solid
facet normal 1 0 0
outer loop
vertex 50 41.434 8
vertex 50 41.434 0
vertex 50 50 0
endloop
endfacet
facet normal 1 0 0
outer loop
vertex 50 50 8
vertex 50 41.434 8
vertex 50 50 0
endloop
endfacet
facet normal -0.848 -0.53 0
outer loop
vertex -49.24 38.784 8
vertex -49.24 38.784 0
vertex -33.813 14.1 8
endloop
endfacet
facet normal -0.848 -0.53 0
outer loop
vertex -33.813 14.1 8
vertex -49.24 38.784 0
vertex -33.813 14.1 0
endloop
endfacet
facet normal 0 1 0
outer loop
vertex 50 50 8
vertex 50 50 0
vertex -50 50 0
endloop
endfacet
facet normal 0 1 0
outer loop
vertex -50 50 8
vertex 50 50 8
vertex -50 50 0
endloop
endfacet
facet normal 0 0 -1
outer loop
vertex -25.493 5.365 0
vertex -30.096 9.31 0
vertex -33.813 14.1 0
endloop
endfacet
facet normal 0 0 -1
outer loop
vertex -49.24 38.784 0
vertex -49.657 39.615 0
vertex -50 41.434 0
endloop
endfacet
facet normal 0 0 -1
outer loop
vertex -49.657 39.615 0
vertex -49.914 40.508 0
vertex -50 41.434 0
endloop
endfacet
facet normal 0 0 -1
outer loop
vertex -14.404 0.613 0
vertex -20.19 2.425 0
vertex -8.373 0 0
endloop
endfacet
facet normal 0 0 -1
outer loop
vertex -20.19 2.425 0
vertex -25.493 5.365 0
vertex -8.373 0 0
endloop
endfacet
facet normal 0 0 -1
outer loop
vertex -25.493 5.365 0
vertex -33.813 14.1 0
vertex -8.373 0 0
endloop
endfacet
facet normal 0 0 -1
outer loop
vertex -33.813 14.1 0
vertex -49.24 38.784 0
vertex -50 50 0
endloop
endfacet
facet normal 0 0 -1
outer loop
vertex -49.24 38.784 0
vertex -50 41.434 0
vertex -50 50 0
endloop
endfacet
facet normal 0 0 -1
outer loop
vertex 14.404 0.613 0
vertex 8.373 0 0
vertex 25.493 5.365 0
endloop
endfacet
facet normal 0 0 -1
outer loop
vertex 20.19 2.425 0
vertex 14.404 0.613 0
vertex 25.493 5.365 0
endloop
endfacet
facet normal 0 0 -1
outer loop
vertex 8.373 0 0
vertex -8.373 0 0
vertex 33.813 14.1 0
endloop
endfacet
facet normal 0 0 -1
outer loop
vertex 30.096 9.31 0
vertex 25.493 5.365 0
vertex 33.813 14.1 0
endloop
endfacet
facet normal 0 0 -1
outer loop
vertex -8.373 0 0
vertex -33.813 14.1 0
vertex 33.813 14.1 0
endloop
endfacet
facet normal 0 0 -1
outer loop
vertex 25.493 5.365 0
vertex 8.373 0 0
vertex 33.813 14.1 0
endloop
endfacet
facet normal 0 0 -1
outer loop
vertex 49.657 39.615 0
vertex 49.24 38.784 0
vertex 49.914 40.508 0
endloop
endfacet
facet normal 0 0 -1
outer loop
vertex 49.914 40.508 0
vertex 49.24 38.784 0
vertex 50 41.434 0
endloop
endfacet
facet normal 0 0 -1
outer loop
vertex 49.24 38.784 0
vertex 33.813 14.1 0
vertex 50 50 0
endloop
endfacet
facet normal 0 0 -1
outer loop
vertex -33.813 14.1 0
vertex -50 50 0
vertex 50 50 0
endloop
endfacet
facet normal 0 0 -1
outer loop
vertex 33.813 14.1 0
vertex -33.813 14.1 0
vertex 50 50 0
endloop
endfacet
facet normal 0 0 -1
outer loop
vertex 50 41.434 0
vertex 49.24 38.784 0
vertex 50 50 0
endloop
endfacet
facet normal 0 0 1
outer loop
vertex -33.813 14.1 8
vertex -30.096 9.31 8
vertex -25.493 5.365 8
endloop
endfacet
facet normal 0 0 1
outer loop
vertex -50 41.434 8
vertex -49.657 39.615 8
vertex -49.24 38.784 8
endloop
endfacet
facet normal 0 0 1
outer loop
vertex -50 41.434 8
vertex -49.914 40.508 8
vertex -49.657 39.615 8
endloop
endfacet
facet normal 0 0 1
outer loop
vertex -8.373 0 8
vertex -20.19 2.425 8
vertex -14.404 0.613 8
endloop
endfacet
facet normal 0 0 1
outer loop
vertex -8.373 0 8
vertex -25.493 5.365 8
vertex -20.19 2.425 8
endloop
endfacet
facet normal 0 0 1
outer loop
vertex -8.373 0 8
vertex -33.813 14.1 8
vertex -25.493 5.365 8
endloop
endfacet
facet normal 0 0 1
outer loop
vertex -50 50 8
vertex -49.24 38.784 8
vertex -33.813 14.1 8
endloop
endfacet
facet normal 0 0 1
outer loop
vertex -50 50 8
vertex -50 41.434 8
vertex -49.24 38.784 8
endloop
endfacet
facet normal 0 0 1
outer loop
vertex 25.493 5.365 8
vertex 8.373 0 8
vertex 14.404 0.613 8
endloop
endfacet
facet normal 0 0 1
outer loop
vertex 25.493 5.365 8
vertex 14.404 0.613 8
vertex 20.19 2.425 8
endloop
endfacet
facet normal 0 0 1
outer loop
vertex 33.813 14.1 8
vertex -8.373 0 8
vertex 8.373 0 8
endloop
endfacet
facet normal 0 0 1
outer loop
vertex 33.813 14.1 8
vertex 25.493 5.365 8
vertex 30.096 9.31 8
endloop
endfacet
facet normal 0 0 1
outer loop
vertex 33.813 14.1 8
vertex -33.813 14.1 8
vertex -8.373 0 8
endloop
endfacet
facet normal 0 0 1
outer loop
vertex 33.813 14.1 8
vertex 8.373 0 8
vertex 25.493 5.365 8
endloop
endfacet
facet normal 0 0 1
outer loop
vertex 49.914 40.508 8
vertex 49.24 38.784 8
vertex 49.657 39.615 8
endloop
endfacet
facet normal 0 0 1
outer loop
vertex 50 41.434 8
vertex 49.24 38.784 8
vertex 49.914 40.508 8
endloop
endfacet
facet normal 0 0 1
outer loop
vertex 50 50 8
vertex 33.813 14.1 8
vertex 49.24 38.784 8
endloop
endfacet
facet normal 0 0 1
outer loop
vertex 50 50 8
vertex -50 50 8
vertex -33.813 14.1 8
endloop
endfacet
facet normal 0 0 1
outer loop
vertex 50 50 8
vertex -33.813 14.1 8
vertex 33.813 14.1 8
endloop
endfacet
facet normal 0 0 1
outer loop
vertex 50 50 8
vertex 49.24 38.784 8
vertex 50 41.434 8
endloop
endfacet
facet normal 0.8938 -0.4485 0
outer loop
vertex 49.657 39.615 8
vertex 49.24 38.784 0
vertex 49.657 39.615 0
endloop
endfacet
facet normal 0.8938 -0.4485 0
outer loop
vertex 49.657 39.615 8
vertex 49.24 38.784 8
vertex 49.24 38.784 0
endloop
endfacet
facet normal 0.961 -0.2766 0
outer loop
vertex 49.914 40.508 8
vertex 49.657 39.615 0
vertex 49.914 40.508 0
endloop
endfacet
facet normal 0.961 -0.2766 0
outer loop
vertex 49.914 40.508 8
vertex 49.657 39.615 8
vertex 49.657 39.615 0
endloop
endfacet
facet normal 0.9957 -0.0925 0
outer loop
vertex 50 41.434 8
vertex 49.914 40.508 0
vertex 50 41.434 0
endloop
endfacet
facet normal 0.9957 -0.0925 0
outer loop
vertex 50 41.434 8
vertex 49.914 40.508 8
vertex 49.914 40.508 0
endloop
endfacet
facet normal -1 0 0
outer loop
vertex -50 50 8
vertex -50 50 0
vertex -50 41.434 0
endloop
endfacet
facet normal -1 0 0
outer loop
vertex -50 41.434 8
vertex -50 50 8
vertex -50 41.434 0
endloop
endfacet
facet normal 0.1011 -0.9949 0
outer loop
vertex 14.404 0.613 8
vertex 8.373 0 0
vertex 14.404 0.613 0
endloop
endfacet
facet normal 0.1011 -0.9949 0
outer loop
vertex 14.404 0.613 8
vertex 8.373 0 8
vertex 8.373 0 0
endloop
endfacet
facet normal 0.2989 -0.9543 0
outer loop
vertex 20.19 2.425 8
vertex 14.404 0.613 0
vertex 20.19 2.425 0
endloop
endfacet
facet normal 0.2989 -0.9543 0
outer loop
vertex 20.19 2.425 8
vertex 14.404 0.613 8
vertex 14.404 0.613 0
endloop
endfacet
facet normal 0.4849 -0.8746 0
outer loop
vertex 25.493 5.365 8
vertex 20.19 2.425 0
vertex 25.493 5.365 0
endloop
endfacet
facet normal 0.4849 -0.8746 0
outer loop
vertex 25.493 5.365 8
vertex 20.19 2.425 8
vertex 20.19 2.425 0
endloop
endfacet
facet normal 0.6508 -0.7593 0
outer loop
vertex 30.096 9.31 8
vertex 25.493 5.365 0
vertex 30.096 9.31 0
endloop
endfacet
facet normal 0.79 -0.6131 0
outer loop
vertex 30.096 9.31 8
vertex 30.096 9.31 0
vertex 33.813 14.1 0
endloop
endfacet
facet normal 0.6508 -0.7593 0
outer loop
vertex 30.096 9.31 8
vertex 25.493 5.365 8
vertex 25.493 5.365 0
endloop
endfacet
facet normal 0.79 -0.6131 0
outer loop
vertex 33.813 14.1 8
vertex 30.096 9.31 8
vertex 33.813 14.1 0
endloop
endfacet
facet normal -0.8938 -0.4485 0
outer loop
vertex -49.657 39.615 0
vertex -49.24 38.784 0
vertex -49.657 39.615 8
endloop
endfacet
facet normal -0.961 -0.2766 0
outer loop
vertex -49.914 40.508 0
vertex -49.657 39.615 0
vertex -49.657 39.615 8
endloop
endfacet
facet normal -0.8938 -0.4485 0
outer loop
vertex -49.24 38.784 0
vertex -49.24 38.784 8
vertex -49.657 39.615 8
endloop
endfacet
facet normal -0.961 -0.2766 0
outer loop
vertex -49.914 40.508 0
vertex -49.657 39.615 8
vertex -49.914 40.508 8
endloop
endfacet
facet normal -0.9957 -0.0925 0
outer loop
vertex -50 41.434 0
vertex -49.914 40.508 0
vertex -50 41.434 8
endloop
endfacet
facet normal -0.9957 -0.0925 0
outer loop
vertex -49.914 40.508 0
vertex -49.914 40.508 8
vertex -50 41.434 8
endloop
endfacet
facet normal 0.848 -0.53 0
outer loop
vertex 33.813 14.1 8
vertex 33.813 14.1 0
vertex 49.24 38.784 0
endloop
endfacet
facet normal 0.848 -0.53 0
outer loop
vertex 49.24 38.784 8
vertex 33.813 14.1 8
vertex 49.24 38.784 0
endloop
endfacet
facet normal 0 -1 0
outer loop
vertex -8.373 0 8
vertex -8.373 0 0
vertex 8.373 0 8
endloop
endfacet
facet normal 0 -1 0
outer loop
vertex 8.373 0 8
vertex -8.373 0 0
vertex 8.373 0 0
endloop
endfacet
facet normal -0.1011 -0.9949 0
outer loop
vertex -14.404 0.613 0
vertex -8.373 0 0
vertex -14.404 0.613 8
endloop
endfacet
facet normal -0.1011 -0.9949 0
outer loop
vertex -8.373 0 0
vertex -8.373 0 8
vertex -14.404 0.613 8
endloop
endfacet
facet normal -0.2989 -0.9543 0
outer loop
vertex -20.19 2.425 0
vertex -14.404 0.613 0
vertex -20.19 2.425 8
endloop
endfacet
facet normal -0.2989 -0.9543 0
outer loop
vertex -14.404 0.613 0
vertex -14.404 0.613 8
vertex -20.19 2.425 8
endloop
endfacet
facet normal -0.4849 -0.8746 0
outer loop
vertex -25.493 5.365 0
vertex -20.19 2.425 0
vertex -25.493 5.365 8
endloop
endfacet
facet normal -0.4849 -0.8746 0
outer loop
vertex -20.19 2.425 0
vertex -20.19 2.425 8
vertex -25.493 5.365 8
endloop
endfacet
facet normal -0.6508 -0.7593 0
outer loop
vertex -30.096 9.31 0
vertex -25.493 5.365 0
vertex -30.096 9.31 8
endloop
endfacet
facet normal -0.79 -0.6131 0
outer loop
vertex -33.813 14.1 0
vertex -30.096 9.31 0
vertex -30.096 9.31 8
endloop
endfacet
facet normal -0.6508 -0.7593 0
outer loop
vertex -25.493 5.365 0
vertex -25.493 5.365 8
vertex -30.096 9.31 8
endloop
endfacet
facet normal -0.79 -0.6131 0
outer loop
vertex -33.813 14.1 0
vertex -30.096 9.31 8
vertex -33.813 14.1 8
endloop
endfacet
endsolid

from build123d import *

# Parameters (mm, degrees)
EXTRUDE_1_DEPTH = 8
FILLET_1_R      = 30
FILLET_2_R      = 5


with BuildPart() as part:
    # 草图1 → 凸台-拉伸1 (new body)
    with BuildSketch(Plane.XY):
        Polygon((-25, 0), (25, 0), (50, 40), (50, 50), (-50, 50), (-50, 40), align=None)
    extrude(amount=EXTRUDE_1_DEPTH)

    # 圆角1
    fillet_1_edges = [part.edges().sort_by_distance(p)[0] for p in [
        (25, 0, 4),
        (-25, 0, 4),
    ]]
    fillet(fillet_1_edges, radius=FILLET_1_R)

    # 圆角2
    fillet_2_edges = [part.edges().sort_by_distance(p)[0] for p in [
        (50, 40, 4),
        (-50, 40, 4),
    ]]
    fillet(fillet_2_edges, radius=FILLET_2_R)


solid = part.part
